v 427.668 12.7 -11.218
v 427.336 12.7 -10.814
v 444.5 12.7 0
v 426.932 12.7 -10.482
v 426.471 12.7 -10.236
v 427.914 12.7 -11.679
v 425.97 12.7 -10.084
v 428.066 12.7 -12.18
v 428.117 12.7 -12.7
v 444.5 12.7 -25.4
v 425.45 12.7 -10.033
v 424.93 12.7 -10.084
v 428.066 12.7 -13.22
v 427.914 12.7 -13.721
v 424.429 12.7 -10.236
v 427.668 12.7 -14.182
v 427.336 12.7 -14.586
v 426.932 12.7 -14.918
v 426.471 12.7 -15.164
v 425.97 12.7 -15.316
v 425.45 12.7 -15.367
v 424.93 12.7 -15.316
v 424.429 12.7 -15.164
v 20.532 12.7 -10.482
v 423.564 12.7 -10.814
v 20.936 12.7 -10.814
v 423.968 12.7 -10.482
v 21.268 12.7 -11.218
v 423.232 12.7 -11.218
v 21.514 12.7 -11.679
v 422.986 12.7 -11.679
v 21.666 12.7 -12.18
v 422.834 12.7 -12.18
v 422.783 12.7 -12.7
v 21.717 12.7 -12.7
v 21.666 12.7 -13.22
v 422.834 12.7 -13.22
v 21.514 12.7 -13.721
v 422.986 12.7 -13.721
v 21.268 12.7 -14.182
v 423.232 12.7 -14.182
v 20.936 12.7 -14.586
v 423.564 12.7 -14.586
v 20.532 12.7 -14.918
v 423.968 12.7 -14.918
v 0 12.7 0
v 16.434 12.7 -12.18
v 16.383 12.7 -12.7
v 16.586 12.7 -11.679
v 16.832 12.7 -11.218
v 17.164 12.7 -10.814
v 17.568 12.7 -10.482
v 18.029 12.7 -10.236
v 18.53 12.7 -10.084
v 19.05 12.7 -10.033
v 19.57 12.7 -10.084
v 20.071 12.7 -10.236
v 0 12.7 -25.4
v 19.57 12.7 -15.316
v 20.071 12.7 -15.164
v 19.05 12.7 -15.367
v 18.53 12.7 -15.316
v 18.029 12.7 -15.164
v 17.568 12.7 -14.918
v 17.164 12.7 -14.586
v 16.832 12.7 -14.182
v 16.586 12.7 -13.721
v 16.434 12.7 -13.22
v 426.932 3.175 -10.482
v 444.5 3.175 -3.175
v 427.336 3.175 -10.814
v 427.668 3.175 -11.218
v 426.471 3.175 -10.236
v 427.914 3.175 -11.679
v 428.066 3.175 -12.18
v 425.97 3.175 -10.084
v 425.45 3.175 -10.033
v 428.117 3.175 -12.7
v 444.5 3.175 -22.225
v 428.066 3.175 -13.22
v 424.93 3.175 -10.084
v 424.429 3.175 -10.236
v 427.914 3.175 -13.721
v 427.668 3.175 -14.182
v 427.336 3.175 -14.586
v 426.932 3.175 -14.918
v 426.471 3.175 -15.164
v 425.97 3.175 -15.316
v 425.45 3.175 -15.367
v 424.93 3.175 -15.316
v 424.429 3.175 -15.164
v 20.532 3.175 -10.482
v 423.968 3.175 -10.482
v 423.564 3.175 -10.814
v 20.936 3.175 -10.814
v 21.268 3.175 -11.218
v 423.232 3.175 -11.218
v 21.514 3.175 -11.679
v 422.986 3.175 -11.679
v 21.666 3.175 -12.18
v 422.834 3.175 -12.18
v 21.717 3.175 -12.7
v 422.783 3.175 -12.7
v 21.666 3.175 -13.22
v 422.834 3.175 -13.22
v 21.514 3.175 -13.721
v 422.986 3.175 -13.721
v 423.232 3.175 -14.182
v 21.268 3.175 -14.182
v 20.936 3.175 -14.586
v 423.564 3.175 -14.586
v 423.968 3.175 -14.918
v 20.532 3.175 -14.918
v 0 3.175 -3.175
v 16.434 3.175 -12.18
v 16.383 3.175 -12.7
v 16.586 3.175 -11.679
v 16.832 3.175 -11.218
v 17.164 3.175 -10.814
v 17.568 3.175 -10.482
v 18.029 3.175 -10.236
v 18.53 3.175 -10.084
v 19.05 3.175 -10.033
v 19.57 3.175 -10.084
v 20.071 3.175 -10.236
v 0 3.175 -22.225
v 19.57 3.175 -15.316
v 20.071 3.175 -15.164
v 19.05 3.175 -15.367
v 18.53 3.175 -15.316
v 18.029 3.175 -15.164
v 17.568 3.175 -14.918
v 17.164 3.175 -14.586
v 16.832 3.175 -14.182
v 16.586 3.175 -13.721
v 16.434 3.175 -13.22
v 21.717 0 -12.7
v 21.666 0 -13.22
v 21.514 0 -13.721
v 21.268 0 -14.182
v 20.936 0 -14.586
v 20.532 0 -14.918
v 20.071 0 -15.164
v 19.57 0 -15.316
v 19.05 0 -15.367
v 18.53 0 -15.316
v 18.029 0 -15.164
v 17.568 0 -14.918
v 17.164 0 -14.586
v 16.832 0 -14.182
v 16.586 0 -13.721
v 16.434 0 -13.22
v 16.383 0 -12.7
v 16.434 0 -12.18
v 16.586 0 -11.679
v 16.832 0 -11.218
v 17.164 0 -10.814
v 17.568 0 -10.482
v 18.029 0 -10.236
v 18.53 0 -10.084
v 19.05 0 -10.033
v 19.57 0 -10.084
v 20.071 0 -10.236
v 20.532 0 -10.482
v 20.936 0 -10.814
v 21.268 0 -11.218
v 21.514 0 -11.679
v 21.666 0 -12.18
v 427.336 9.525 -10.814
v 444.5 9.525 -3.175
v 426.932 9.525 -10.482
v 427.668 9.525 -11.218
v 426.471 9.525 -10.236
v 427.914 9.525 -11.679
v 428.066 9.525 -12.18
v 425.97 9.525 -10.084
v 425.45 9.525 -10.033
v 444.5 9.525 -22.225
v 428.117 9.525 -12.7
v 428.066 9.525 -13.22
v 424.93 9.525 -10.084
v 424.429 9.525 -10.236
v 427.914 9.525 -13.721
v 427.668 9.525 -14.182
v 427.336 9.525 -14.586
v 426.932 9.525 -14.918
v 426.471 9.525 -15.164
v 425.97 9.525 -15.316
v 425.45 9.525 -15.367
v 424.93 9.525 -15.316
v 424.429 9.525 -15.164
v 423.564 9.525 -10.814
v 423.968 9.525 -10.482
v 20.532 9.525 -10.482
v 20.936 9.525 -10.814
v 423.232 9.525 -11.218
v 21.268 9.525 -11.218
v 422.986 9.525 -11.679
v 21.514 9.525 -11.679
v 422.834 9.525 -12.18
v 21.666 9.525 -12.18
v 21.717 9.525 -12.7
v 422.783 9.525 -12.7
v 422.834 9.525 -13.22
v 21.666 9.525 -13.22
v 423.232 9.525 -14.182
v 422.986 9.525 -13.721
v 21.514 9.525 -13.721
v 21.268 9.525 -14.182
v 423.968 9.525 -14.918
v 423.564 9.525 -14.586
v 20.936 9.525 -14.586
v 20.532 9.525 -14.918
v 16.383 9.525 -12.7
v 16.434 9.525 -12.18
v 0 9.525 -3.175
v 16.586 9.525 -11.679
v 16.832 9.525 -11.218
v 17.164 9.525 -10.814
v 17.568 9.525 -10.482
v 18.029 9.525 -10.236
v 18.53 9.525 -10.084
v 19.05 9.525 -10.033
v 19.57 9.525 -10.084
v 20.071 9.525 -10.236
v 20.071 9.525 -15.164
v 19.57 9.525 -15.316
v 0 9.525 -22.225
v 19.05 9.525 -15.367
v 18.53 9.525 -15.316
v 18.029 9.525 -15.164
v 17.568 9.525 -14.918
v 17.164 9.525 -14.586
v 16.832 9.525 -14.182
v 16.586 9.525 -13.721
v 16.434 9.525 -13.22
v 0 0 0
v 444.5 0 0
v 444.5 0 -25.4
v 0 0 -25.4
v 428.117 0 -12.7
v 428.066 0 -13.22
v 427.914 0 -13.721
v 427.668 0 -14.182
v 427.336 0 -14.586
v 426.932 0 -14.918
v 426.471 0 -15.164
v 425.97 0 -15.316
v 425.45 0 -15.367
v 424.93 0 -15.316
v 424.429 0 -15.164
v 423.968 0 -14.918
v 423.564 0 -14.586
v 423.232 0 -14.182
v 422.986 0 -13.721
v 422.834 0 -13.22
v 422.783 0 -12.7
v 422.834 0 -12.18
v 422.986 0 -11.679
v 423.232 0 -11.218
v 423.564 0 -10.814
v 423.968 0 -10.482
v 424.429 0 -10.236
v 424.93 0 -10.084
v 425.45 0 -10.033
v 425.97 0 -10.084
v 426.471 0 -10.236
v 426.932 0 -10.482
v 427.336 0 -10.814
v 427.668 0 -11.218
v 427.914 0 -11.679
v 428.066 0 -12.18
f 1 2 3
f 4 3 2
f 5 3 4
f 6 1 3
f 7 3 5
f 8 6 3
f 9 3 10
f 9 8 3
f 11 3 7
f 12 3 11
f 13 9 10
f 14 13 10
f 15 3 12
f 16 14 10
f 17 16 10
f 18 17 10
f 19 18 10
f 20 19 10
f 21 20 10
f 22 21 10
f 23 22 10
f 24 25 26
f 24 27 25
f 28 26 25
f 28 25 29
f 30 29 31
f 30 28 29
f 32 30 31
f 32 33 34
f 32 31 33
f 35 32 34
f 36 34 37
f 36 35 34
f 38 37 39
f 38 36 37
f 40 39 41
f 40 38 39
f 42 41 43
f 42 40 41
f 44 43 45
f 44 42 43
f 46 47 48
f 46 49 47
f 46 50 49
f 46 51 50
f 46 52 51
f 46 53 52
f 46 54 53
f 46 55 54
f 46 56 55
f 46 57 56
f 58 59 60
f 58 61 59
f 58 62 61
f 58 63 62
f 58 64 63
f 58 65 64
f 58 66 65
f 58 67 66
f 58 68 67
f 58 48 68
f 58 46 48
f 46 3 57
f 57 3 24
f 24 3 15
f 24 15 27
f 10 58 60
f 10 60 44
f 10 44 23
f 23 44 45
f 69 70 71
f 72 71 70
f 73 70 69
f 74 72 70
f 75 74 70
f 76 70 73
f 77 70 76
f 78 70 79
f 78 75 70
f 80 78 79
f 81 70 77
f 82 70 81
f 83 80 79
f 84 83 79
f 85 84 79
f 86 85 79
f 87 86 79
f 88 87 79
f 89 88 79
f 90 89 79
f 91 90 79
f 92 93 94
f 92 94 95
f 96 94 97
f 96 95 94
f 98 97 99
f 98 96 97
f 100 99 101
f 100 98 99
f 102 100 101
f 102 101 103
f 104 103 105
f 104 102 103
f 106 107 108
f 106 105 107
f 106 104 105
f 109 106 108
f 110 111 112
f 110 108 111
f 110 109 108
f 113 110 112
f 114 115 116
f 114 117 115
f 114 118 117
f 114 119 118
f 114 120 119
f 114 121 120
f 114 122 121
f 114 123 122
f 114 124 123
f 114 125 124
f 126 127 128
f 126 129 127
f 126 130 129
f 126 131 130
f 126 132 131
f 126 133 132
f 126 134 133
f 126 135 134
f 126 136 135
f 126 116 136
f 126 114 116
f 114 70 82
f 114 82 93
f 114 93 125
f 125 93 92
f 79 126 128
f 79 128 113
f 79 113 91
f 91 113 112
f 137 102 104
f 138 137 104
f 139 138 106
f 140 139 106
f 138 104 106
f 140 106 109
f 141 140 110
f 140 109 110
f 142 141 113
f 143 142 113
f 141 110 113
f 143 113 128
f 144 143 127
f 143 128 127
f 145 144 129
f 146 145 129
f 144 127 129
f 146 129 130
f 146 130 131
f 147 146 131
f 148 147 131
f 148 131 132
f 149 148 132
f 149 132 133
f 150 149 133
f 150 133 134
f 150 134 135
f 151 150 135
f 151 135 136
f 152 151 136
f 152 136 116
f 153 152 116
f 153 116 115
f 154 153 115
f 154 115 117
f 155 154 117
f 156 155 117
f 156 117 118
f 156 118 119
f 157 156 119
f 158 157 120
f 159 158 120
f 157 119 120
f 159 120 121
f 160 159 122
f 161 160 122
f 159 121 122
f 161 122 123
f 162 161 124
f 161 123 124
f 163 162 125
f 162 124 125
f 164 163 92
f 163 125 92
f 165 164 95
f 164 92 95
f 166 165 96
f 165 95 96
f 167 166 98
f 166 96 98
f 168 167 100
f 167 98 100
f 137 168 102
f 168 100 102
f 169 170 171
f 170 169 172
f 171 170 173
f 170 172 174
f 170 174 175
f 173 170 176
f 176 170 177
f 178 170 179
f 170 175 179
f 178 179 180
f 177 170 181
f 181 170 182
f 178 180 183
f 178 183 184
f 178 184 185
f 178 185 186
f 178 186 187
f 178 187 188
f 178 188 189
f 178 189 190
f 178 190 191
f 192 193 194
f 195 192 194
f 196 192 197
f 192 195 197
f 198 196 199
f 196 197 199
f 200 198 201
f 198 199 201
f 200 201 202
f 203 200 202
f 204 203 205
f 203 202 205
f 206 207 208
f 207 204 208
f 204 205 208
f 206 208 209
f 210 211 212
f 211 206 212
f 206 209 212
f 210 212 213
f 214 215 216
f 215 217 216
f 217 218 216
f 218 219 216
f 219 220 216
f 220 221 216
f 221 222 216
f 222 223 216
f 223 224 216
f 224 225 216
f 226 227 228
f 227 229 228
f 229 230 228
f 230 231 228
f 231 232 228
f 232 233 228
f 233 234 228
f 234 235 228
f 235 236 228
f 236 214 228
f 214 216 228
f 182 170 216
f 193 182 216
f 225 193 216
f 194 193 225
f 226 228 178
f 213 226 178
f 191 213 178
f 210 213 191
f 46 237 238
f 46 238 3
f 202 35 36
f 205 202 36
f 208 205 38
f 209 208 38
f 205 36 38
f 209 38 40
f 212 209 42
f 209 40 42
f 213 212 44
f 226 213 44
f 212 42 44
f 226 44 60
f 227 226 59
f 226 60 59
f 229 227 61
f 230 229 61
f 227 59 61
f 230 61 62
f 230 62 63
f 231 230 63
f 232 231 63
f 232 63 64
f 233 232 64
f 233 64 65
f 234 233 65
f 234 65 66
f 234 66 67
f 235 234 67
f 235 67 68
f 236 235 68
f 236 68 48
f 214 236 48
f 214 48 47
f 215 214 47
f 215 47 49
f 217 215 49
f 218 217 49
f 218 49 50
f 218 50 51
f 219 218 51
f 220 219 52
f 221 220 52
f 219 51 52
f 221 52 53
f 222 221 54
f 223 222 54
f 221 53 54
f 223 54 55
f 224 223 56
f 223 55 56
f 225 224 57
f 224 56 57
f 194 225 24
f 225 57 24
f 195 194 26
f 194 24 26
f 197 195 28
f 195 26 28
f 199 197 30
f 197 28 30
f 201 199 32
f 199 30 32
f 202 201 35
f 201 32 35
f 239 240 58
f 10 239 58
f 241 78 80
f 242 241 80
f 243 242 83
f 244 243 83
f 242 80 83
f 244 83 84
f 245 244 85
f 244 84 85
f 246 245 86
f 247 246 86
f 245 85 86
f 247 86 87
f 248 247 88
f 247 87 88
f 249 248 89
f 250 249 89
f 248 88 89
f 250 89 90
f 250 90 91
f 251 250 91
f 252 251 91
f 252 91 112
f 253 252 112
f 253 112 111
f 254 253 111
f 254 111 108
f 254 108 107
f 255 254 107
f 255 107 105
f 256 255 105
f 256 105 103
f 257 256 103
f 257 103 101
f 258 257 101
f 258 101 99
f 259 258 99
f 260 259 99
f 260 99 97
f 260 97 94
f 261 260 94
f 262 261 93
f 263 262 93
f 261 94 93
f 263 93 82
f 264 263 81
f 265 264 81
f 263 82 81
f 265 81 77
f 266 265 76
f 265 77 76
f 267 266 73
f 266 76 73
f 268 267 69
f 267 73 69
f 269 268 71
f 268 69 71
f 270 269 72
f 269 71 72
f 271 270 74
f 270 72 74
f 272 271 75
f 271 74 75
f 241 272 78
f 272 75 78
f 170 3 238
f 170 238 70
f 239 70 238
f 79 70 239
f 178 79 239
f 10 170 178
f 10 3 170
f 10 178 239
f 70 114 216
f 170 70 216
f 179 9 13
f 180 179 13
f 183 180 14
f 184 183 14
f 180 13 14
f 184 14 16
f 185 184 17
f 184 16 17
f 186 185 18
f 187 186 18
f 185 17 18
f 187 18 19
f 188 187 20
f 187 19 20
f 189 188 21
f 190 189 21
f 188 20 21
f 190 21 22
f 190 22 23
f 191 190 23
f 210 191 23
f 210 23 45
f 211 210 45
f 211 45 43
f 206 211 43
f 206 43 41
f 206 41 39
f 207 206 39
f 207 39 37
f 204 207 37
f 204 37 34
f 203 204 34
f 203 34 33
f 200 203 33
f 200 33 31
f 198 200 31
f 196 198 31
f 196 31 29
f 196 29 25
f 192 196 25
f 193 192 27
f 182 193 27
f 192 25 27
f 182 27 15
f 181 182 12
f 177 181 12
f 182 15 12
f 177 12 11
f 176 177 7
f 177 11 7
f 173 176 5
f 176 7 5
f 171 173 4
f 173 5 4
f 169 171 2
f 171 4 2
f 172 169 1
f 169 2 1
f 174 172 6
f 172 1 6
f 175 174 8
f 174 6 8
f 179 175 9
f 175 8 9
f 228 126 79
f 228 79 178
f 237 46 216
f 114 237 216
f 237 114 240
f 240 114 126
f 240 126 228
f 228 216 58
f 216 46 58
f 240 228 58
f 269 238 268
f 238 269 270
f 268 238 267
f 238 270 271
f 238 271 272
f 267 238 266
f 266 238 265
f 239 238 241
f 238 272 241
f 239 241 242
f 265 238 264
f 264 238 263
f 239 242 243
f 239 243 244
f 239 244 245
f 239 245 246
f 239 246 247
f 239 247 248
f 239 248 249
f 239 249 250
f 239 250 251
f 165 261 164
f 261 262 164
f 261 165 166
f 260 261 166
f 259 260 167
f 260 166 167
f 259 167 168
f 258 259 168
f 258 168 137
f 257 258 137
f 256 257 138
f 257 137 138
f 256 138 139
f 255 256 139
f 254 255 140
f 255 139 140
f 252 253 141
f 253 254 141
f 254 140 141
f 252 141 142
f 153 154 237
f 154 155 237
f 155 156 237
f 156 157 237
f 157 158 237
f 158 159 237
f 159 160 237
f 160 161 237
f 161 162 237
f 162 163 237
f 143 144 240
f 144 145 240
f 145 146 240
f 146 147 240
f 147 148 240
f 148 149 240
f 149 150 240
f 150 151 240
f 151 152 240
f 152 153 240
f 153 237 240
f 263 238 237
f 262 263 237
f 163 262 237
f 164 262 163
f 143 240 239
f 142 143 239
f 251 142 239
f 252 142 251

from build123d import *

# Parameters (mm, degrees)
SKETCH1_W           = 25.4
SKETCH1_H           = 12.7
SKETCH1_W_2         = 19.05
SKETCH1_H_2         = 6.35
BOSS_EXTRUDE1_DEPTH = 444.5
SKETCH2_R           = 2.667
CUT_EXTRUDE1_DEPTH  = 13.7


with BuildPart() as part:
    # Sketch1 → Boss-Extrude1 (new body)
    with BuildSketch(Plane(origin=(0, 0, 0), x_dir=(0, 0, -1), z_dir=(1, 0, 0))):
        with Locations((12.7, 6.35)):
            Rectangle(SKETCH1_W, SKETCH1_H)
        with Locations((12.7, 6.35)):
            Rectangle(SKETCH1_W_2, SKETCH1_H_2, mode=Mode.SUBTRACT)
    extrude(amount=BOSS_EXTRUDE1_DEPTH)

    # Sketch2 → Cut-Extrude1 (cut, through all)
    with BuildSketch(Plane(origin=(0, 12.7, 0), x_dir=(1, 0, 0), z_dir=(0, 1, 0))):
        with Locations((19.05, 12.7)):
            Circle(SKETCH2_R)
        with Locations((425.45, 12.7)):
            Circle(SKETCH2_R)
    extrude(amount=-CUT_EXTRUDE1_DEPTH, mode=Mode.SUBTRACT)


solid = part.part
